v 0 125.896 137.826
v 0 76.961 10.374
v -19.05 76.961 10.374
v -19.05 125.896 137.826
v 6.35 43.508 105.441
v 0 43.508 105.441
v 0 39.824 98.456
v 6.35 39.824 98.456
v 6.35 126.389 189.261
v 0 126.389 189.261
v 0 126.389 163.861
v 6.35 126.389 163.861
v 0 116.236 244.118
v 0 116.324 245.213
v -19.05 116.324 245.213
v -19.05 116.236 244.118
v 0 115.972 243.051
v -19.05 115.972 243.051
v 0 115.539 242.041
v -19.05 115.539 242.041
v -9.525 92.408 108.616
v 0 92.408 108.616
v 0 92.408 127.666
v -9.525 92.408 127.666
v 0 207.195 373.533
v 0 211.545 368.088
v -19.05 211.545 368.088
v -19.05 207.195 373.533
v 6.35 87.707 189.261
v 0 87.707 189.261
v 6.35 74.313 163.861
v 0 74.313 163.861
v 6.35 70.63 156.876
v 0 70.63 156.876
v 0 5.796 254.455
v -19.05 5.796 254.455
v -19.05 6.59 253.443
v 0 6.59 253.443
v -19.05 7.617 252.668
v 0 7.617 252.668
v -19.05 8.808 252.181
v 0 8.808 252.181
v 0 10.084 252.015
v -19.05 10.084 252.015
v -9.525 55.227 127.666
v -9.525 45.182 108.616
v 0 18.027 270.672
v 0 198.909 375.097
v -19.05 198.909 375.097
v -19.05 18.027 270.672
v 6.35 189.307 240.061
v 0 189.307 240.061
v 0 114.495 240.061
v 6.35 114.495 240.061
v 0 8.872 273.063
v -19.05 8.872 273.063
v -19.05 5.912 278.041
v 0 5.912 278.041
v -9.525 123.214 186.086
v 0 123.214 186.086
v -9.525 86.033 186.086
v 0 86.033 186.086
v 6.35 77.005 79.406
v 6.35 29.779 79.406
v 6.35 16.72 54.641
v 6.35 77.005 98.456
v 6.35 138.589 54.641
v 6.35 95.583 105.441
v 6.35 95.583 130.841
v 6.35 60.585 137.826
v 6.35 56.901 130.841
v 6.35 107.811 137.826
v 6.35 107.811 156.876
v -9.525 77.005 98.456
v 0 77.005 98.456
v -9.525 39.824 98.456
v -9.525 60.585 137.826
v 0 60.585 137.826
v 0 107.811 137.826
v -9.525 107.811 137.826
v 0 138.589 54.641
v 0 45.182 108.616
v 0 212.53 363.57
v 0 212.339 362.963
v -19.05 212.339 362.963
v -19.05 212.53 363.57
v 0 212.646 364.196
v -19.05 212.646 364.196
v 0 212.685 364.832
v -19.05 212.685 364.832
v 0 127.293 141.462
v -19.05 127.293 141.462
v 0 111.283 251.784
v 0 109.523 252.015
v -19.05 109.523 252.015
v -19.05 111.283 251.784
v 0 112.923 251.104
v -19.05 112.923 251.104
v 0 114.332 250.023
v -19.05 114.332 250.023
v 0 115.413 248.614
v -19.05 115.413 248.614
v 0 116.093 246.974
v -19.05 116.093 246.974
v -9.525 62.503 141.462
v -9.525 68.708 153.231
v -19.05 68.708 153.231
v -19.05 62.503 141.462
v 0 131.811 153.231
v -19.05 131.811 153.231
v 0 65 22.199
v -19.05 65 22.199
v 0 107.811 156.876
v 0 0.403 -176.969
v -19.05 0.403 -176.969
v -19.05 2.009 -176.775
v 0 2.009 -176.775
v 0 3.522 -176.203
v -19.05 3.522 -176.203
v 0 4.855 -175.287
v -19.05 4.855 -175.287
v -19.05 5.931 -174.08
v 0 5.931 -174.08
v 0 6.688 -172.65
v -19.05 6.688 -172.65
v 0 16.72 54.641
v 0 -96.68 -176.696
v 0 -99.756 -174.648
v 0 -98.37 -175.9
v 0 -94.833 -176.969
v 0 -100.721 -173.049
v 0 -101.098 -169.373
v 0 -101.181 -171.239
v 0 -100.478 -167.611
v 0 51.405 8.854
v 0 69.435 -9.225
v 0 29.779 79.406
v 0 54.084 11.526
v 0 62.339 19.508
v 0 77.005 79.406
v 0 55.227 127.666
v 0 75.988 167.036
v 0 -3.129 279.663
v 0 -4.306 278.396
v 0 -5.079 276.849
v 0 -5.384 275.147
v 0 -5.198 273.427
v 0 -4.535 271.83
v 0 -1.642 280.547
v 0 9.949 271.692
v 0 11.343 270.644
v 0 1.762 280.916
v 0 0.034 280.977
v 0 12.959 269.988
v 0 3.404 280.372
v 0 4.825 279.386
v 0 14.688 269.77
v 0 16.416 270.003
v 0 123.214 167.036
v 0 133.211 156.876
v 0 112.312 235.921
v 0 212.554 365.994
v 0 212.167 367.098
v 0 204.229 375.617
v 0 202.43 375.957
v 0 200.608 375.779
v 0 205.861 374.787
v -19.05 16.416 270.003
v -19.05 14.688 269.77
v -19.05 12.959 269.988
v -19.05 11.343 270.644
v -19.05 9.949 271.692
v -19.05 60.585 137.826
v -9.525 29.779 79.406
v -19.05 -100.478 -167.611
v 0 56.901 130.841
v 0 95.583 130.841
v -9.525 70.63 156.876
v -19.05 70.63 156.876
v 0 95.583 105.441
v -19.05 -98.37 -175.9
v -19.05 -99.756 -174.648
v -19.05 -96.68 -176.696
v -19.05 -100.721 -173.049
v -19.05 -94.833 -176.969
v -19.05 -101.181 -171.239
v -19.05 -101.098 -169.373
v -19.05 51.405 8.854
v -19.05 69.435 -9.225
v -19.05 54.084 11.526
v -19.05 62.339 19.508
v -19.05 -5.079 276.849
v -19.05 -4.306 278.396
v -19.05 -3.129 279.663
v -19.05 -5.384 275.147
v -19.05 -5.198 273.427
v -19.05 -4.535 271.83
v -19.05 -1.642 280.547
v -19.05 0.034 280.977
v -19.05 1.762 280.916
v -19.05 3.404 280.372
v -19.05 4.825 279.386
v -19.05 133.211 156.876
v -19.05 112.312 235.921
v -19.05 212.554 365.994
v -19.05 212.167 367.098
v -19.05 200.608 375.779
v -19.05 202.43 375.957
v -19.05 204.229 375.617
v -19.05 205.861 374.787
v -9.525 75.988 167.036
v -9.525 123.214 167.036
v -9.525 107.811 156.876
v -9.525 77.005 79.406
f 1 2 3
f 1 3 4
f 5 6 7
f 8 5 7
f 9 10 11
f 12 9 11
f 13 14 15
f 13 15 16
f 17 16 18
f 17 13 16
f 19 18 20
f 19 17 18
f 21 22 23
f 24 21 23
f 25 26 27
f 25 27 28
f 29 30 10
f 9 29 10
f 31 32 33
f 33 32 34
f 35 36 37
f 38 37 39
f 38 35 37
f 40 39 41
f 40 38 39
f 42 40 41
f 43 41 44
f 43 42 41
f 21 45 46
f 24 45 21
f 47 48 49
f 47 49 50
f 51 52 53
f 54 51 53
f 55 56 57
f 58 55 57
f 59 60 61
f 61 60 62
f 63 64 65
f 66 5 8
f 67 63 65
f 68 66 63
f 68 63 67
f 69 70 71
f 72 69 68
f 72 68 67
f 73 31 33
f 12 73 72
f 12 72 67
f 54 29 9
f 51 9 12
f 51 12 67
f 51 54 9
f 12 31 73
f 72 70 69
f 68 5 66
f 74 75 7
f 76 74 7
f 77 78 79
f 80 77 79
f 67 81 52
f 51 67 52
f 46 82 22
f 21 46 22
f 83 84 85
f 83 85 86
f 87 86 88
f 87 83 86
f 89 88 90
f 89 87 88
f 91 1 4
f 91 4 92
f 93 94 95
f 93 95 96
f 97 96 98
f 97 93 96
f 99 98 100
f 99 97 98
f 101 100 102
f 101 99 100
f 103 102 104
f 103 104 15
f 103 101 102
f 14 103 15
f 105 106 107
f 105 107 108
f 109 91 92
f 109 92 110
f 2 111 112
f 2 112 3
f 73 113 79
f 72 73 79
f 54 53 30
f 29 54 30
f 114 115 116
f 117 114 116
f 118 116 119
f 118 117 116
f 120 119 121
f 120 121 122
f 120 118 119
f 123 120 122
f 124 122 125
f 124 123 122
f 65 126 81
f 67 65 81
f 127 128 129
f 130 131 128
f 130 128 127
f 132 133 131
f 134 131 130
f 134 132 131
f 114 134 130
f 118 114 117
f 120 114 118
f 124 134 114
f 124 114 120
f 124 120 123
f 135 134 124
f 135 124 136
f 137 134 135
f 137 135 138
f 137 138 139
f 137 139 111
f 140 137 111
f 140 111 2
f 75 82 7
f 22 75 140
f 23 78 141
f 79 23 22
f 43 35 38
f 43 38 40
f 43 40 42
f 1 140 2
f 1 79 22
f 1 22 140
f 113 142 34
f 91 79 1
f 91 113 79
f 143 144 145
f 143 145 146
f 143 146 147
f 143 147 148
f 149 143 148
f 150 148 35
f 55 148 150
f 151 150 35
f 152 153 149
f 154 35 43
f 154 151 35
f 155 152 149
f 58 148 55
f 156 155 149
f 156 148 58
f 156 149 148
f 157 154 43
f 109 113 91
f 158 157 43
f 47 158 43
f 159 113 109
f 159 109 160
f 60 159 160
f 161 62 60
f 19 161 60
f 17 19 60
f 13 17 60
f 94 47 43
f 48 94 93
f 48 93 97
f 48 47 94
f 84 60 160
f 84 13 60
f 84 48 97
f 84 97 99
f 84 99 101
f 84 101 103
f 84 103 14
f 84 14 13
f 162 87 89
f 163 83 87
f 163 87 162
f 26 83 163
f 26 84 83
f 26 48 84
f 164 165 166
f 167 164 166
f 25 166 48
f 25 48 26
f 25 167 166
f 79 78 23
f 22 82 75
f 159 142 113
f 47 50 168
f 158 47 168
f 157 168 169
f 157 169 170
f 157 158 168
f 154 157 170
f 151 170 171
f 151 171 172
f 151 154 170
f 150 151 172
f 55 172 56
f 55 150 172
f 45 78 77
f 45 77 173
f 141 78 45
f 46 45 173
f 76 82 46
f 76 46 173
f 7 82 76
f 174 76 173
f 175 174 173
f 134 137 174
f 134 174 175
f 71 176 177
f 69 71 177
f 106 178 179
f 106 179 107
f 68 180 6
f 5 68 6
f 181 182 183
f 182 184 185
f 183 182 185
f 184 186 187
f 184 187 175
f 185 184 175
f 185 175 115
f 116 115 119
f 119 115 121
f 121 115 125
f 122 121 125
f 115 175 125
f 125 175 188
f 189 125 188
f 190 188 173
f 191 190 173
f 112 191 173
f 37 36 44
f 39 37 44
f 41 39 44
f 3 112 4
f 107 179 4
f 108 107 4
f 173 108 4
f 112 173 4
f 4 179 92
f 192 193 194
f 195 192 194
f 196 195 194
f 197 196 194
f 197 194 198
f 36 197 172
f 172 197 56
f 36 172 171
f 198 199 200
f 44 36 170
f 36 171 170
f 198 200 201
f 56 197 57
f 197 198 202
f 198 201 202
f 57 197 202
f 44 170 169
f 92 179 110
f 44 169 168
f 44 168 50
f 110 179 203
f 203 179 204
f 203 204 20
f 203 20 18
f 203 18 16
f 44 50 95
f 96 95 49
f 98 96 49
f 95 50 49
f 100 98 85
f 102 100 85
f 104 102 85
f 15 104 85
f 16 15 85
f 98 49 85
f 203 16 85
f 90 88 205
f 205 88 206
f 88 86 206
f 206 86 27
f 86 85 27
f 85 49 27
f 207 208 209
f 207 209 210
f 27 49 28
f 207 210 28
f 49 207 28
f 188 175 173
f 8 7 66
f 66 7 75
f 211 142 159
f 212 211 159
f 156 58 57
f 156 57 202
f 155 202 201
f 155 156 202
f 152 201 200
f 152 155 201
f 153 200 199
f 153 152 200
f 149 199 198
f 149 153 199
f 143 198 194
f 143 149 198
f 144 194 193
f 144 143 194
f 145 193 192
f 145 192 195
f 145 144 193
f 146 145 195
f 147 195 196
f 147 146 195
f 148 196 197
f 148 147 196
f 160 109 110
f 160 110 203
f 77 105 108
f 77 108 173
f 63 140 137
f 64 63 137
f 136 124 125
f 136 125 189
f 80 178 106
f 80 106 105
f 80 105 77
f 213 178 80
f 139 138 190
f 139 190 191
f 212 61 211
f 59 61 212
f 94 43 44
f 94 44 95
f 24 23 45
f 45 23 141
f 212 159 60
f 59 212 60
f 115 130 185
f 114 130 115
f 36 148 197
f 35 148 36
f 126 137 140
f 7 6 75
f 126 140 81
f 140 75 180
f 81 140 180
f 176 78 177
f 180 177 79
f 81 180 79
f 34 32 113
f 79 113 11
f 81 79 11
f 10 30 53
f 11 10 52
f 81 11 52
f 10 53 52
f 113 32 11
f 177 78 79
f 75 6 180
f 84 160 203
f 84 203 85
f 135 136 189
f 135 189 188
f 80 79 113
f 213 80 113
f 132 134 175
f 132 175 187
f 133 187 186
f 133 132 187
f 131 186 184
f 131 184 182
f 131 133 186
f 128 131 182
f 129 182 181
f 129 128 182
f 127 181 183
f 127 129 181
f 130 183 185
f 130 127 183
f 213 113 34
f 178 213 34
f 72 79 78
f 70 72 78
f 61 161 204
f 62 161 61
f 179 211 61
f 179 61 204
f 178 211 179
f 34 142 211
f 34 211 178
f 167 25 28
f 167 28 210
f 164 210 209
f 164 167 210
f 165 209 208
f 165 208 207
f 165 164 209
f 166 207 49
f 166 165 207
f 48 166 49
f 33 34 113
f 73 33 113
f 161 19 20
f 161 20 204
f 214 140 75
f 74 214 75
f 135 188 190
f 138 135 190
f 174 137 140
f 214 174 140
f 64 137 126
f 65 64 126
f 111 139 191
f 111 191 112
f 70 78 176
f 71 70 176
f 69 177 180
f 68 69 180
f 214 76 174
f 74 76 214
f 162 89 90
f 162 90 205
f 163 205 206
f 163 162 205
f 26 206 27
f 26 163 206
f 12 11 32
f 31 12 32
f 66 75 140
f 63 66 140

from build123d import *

# Parameters (mm, degrees)
F1_DEPTH = 19.05
F2_DEPTH = 9.525
F4_DEPTH = 9.525
F6_DEPTH = 6.35


with BuildPart() as f1:
    # F0 (on Right) → F1 (new body)
    with BuildSketch(Plane.YZ):
        with BuildLine():
            Line((107.8105096246, 137.8255506157), (60.584697992, 137.8255506157))
            Line((60.584697992, 137.8255506157), (-100.4775027292, -167.6112887093))
            ThreePointArc((-100.4775027292, -167.6112887093), (-93.299548024, -164.393306065), (-88.4512654679, -170.5878683824))
            ThreePointArc((-88.4512654679, -170.5878683824), (-90.3203579793, -175.1002568729), (-94.8327464698, -176.9693493843))
            Line((-94.8327464698, -176.9693493843), (0.4028879757, -176.9693493843))
            ThreePointArc((0.4028879757, -176.9693493843), (-4.3573678281, -165.4770754727), (7.1349061245, -170.2373311774))
            ThreePointArc((7.1349061245, -170.2373311774), (7.0221296111, -171.4644043382), (6.6875785934, -172.6503650038))
            Line((6.6875785934, -172.6503650038), (69.4354078581, -9.2251603942))
            Line((69.4354078581, -9.2251603942), (51.4045041163, 8.8536352936))
            Line((51.4045041163, 8.8536352936), (35.6487024834, 24.651285966))
            Line((35.6487024834, 24.651285966), (49.2340543405, 37.7873572342))
            Line((49.2340543405, 37.7873572342), (65.0000235232, 22.1994516607))
            Line((65.0000235232, 22.1994516607), (76.9605831289, 10.3739767037))
            Line((76.9605831289, 10.3739767037), (125.8961779685, 137.8255506157))
            Line((125.8961779685, 137.8255506157), (107.8105096246, 137.8255506157))
        make_face()
        Polygon((54.0841673908, 11.5261999599), (62.3391481966, 19.5081806493), (49.2045912393, 32.4943936268), (41.0426405432, 24.6023664522), align=None)
        with BuildLine():
            ThreePointArc((-88.4512654679, -170.5878683824), (-93.299548024, -164.393306065), (-100.4775027292, -167.6112887093))
            ThreePointArc((-100.4775027292, -167.6112887093), (-100.2970985088, -173.8839503856), (-94.8327464698, -176.9693493843))
            ThreePointArc((-94.8327464698, -176.9693493843), (-90.3203579793, -175.1002568729), (-88.4512654679, -170.5878683824))
        make_face()
        with BuildLine():
            ThreePointArc((7.1349061245, -170.2373311774), (-4.3573678281, -165.4770754727), (0.4028879757, -176.9693493843))
            ThreePointArc((0.4028879757, -176.9693493843), (4.2157268763, -175.7855136017), (6.6875785934, -172.6503650038))
            ThreePointArc((6.6875785934, -172.6503650038), (7.0221296111, -171.4644043382), (7.1349061245, -170.2373311774))
        make_face()
        Polygon((107.8105096246, 153.2306506157), (68.7080773257, 153.2306506157), (62.5025140542, 141.4624789193), (107.8105096246, 141.4624789193), align=None)
        Polygon((70.6300970032, 156.8755506157), (68.7080773257, 153.2306506157), (107.8105096246, 153.2306506157), (107.8105096246, 156.8755506157), align=None)
        with BuildLine():
            ThreePointArc((5.9119667471, 278.0406470607), (-2.416777475, 280.1584694734), (-4.5346000097, 271.8297252823))
            ThreePointArc((-4.5346000097, 271.8297252823), (2.298982141, 269.0757053504), (6.7654075798, 274.935186095))
            ThreePointArc((6.7654075798, 274.935186095), (6.5481641351, 276.5454849077), (5.9119667471, 278.0406470607))
        make_face()
        with BuildLine():
            ThreePointArc((5.7955029154, 254.4548318699), (7.6169859512, 252.6679835461), (10.0837359097, 252.0154714584))
            ThreePointArc((10.0837359097, 252.0154714584), (13.6114167441, 253.4766847038), (15.0726299895, 257.0043655382))
            ThreePointArc((15.0726299895, 257.0043655382), (8.7617064204, 261.8149062738), (5.7955029154, 254.4548318699))
        make_face()
        with BuildLine():
            Line((12.2691077497, 267.3481449502), (18.0266256783, 270.6720260533))
            ThreePointArc((18.0266256783, 270.6720260533), (12.9585284918, 269.9884074479), (8.8716515535, 273.0625545461))
            Line((8.8716515535, 273.0625545461), (12.2691077497, 267.3481449502))
        make_face()
        with BuildLine():
            ThreePointArc((198.908507512, 375.0972100255), (195.9540529554, 367.6168261352), (202.5700754122, 363.0437318081))
            ThreePointArc((202.5700754122, 363.0437318081), (203.5452578089, 368.2678630513), (208.5946207116, 369.9251084256))
            ThreePointArc((208.5946207116, 369.9251084256), (208.170777629, 371.8361839166), (207.1945464433, 373.5328940164))
            ThreePointArc((207.1945464433, 373.5328940164), (203.3415493994, 375.8512742828), (198.908507512, 375.0972100255))
        make_face()
        with BuildLine():
            ThreePointArc((202.5700754122, 363.0437318081), (207.4262559095, 359.6167612843), (212.3385946935, 362.9627355317))
            ThreePointArc((212.3385946935, 362.9627355317), (212.5977898503, 363.8815645178), (212.6851640466, 364.8322456341))
            ThreePointArc((212.6851640466, 364.8322456341), (212.3917535412, 366.5569401802), (211.5445340178, 368.0875871289))
            ThreePointArc((211.5445340178, 368.0875871289), (210.2271300628, 369.2592791589), (208.5946207116, 369.9251084256))
            ThreePointArc((208.5946207116, 369.9251084256), (208.6052822642, 369.7109387298), (208.608837418, 369.4965333003))
            ThreePointArc((208.608837418, 369.4965333003), (206.8636749781, 365.0776733325), (202.5700754122, 363.0437318081))
        make_face()
        with BuildLine():
            ThreePointArc((208.5946207116, 369.9251084256), (203.5452578089, 368.2678630513), (202.5700754122, 363.0437318081))
            ThreePointArc((202.5700754122, 363.0437318081), (206.8636749781, 365.0776733325), (208.608837418, 369.4965333003))
            ThreePointArc((208.608837418, 369.4965333003), (208.6052822642, 369.7109387298), (208.5946207116, 369.9251084256))
        make_face()
        with BuildLine():
            ThreePointArc((208.5946207116, 369.9251084256), (210.2271300628, 369.2592791589), (211.5445340178, 368.0875871289))
            Line((211.5445340178, 368.0875871289), (207.1945464433, 373.5328940164))
            ThreePointArc((207.1945464433, 373.5328940164), (208.170777629, 371.8361839166), (208.5946207116, 369.9251084256))
        make_face()
        Polygon((62.3391481966, 19.5081806493), (65.0000235232, 22.1994516607), (49.2340543405, 37.7873572342), (35.6487024834, 24.651285966), (51.4045041163, 8.8536352936), (54.0841673908, 11.5261999599), (41.0426405432, 24.6023664522), (49.2045912393, 32.4943936268), align=None)
        with BuildLine():
            Line((112.3124022113, 235.9214813278), (70.6300970032, 156.8755506157))
            Line((70.6300970032, 156.8755506157), (107.8105096246, 156.8755506157))
            Line((107.8105096246, 156.8755506157), (133.2105096246, 156.8755506157))
            Line((133.2105096246, 156.8755506157), (212.3385946935, 362.9627355317))
            ThreePointArc((212.3385946935, 362.9627355317), (207.4262559095, 359.6167612843), (202.5700754122, 363.0437318081))
            ThreePointArc((202.5700754122, 363.0437318081), (195.9540529554, 367.6168261352), (198.908507512, 375.0972100255))
            Line((198.908507512, 375.0972100255), (18.0266256783, 270.6720260533))
            Line((18.0266256783, 270.6720260533), (12.2691077497, 267.3481449502))
            Line((12.2691077497, 267.3481449502), (8.8716515535, 273.0625545461))
            Line((8.8716515535, 273.0625545461), (5.9119667471, 278.0406470607))
            ThreePointArc((5.9119667471, 278.0406470607), (6.5481641351, 276.5454849077), (6.7654075798, 274.935186095))
            ThreePointArc((6.7654075798, 274.935186095), (2.298982141, 269.0757053504), (-4.5346000097, 271.8297252823))
            Line((-4.5346000097, 271.8297252823), (5.7955029154, 254.4548318699))
            ThreePointArc((5.7955029154, 254.4548318699), (8.7617064204, 261.8149062738), (15.0726299895, 257.0043655382))
            ThreePointArc((15.0726299895, 257.0043655382), (13.6114167441, 253.4766847038), (10.0837359097, 252.0154714584))
            Line((10.0837359097, 252.0154714584), (109.522503886, 252.0154714584))
            ThreePointArc((109.522503886, 252.0154714584), (114.3322296104, 250.0232178321), (116.3244832368, 245.2134921076))
            ThreePointArc((116.3244832368, 245.2134921076), (116.1252477883, 243.5792656699), (115.5392129758, 242.0407748468))
            Line((115.5392129758, 242.0407748468), (112.3124022113, 235.9214813278))
        make_face()
        Polygon((107.8105096246, 141.4624789193), (62.5025140542, 141.4624789193), (60.584697992, 137.8255506157), (107.8105096246, 137.8255506157), align=None)
        Polygon((131.8110341678, 153.2306506157), (107.8105096246, 153.2306506157), (107.8105096246, 141.4624789193), (127.2925926573, 141.4624789193), align=None)
        Polygon((107.8105096246, 156.8755506157), (107.8105096246, 153.2306506157), (131.8110341678, 153.2306506157), (133.2105096246, 156.8755506157), align=None)
        Polygon((127.2925926573, 141.4624789193), (107.8105096246, 141.4624789193), (107.8105096246, 137.8255506157), (125.8961779685, 137.8255506157), align=None)
    extrude(amount=-F1_DEPTH)

    # F0 (on Right) → F2 (cut)
    with BuildSketch(Plane.YZ):
        Polygon((70.6300970032, 156.8755506157), (68.7080773257, 153.2306506157), (107.8105096246, 153.2306506157), (107.8105096246, 156.8755506157), align=None)
        Polygon((107.8105096246, 153.2306506157), (68.7080773257, 153.2306506157), (62.5025140542, 141.4624789193), (107.8105096246, 141.4624789193), align=None)
        Polygon((107.8105096246, 141.4624789193), (62.5025140542, 141.4624789193), (60.584697992, 137.8255506157), (107.8105096246, 137.8255506157), align=None)
    extrude(amount=-F2_DEPTH, mode=Mode.SUBTRACT)

    # F3 (on face) → F4 (cut)
    with BuildSketch(Plane.YZ):
        Polygon((86.0330421537, 186.0855506157), (75.9876431425, 167.0355506157), (123.2138631425, 167.0355506157), (123.2138631425, 186.0855506157), align=None)
        Polygon((92.4079728415, 127.6655506157), (55.2271518527, 127.6655506157), (45.1817528415, 108.6155506157), (92.4079728415, 108.6155506157), align=None)
        Polygon((77.005027691, 98.4555506157), (39.8242067022, 98.4555506157), (29.778807691, 79.4055506157), (77.005027691, 79.4055506157), align=None)
    extrude(amount=-F4_DEPTH, mode=Mode.SUBTRACT)


with BuildPart() as f6:
    # F5 (on face) → F6 (new body)
    with BuildSketch(Plane.YZ):
        Polygon((87.7072753222, 189.2605506157), (126.3888631425, 189.2605506157), (126.3888631425, 163.8605506157), (75.9876431425, 163.8605506157), (74.3134099739, 163.8605506157), (70.6300970032, 156.8755506157), (107.8105096246, 156.8755506157), (107.8105096246, 137.8255506157), (60.584697992, 137.8255506157), (56.9013850212, 130.8405506157), (95.5829728415, 130.8405506157), (95.5829728415, 105.4405506157), (45.1817528415, 105.4405506157), (43.5075196729, 105.4405506157), (39.8242067022, 98.4555506157), (77.005027691, 98.4555506157), (77.005027691, 79.4055506157), (29.778807691, 79.4055506157), (16.7197889764, 54.6405506157), (45.1817528415, 54.6405506157), (93.9569297365, 54.6405506157), (165.1497578566, 240.0605506157), (126.3888631425, 240.0605506157), (114.4950060187, 240.0605506157), align=None)
        Polygon((189.3072753222, 240.0605506157), (165.1497578566, 240.0605506157), (93.9569297365, 54.6405506157), (95.5829728415, 54.6405506157), (138.5887376755, 54.6405506157), align=None)
    extrude(amount=F6_DEPTH)


solid = Compound([f1.part, f6.part])
